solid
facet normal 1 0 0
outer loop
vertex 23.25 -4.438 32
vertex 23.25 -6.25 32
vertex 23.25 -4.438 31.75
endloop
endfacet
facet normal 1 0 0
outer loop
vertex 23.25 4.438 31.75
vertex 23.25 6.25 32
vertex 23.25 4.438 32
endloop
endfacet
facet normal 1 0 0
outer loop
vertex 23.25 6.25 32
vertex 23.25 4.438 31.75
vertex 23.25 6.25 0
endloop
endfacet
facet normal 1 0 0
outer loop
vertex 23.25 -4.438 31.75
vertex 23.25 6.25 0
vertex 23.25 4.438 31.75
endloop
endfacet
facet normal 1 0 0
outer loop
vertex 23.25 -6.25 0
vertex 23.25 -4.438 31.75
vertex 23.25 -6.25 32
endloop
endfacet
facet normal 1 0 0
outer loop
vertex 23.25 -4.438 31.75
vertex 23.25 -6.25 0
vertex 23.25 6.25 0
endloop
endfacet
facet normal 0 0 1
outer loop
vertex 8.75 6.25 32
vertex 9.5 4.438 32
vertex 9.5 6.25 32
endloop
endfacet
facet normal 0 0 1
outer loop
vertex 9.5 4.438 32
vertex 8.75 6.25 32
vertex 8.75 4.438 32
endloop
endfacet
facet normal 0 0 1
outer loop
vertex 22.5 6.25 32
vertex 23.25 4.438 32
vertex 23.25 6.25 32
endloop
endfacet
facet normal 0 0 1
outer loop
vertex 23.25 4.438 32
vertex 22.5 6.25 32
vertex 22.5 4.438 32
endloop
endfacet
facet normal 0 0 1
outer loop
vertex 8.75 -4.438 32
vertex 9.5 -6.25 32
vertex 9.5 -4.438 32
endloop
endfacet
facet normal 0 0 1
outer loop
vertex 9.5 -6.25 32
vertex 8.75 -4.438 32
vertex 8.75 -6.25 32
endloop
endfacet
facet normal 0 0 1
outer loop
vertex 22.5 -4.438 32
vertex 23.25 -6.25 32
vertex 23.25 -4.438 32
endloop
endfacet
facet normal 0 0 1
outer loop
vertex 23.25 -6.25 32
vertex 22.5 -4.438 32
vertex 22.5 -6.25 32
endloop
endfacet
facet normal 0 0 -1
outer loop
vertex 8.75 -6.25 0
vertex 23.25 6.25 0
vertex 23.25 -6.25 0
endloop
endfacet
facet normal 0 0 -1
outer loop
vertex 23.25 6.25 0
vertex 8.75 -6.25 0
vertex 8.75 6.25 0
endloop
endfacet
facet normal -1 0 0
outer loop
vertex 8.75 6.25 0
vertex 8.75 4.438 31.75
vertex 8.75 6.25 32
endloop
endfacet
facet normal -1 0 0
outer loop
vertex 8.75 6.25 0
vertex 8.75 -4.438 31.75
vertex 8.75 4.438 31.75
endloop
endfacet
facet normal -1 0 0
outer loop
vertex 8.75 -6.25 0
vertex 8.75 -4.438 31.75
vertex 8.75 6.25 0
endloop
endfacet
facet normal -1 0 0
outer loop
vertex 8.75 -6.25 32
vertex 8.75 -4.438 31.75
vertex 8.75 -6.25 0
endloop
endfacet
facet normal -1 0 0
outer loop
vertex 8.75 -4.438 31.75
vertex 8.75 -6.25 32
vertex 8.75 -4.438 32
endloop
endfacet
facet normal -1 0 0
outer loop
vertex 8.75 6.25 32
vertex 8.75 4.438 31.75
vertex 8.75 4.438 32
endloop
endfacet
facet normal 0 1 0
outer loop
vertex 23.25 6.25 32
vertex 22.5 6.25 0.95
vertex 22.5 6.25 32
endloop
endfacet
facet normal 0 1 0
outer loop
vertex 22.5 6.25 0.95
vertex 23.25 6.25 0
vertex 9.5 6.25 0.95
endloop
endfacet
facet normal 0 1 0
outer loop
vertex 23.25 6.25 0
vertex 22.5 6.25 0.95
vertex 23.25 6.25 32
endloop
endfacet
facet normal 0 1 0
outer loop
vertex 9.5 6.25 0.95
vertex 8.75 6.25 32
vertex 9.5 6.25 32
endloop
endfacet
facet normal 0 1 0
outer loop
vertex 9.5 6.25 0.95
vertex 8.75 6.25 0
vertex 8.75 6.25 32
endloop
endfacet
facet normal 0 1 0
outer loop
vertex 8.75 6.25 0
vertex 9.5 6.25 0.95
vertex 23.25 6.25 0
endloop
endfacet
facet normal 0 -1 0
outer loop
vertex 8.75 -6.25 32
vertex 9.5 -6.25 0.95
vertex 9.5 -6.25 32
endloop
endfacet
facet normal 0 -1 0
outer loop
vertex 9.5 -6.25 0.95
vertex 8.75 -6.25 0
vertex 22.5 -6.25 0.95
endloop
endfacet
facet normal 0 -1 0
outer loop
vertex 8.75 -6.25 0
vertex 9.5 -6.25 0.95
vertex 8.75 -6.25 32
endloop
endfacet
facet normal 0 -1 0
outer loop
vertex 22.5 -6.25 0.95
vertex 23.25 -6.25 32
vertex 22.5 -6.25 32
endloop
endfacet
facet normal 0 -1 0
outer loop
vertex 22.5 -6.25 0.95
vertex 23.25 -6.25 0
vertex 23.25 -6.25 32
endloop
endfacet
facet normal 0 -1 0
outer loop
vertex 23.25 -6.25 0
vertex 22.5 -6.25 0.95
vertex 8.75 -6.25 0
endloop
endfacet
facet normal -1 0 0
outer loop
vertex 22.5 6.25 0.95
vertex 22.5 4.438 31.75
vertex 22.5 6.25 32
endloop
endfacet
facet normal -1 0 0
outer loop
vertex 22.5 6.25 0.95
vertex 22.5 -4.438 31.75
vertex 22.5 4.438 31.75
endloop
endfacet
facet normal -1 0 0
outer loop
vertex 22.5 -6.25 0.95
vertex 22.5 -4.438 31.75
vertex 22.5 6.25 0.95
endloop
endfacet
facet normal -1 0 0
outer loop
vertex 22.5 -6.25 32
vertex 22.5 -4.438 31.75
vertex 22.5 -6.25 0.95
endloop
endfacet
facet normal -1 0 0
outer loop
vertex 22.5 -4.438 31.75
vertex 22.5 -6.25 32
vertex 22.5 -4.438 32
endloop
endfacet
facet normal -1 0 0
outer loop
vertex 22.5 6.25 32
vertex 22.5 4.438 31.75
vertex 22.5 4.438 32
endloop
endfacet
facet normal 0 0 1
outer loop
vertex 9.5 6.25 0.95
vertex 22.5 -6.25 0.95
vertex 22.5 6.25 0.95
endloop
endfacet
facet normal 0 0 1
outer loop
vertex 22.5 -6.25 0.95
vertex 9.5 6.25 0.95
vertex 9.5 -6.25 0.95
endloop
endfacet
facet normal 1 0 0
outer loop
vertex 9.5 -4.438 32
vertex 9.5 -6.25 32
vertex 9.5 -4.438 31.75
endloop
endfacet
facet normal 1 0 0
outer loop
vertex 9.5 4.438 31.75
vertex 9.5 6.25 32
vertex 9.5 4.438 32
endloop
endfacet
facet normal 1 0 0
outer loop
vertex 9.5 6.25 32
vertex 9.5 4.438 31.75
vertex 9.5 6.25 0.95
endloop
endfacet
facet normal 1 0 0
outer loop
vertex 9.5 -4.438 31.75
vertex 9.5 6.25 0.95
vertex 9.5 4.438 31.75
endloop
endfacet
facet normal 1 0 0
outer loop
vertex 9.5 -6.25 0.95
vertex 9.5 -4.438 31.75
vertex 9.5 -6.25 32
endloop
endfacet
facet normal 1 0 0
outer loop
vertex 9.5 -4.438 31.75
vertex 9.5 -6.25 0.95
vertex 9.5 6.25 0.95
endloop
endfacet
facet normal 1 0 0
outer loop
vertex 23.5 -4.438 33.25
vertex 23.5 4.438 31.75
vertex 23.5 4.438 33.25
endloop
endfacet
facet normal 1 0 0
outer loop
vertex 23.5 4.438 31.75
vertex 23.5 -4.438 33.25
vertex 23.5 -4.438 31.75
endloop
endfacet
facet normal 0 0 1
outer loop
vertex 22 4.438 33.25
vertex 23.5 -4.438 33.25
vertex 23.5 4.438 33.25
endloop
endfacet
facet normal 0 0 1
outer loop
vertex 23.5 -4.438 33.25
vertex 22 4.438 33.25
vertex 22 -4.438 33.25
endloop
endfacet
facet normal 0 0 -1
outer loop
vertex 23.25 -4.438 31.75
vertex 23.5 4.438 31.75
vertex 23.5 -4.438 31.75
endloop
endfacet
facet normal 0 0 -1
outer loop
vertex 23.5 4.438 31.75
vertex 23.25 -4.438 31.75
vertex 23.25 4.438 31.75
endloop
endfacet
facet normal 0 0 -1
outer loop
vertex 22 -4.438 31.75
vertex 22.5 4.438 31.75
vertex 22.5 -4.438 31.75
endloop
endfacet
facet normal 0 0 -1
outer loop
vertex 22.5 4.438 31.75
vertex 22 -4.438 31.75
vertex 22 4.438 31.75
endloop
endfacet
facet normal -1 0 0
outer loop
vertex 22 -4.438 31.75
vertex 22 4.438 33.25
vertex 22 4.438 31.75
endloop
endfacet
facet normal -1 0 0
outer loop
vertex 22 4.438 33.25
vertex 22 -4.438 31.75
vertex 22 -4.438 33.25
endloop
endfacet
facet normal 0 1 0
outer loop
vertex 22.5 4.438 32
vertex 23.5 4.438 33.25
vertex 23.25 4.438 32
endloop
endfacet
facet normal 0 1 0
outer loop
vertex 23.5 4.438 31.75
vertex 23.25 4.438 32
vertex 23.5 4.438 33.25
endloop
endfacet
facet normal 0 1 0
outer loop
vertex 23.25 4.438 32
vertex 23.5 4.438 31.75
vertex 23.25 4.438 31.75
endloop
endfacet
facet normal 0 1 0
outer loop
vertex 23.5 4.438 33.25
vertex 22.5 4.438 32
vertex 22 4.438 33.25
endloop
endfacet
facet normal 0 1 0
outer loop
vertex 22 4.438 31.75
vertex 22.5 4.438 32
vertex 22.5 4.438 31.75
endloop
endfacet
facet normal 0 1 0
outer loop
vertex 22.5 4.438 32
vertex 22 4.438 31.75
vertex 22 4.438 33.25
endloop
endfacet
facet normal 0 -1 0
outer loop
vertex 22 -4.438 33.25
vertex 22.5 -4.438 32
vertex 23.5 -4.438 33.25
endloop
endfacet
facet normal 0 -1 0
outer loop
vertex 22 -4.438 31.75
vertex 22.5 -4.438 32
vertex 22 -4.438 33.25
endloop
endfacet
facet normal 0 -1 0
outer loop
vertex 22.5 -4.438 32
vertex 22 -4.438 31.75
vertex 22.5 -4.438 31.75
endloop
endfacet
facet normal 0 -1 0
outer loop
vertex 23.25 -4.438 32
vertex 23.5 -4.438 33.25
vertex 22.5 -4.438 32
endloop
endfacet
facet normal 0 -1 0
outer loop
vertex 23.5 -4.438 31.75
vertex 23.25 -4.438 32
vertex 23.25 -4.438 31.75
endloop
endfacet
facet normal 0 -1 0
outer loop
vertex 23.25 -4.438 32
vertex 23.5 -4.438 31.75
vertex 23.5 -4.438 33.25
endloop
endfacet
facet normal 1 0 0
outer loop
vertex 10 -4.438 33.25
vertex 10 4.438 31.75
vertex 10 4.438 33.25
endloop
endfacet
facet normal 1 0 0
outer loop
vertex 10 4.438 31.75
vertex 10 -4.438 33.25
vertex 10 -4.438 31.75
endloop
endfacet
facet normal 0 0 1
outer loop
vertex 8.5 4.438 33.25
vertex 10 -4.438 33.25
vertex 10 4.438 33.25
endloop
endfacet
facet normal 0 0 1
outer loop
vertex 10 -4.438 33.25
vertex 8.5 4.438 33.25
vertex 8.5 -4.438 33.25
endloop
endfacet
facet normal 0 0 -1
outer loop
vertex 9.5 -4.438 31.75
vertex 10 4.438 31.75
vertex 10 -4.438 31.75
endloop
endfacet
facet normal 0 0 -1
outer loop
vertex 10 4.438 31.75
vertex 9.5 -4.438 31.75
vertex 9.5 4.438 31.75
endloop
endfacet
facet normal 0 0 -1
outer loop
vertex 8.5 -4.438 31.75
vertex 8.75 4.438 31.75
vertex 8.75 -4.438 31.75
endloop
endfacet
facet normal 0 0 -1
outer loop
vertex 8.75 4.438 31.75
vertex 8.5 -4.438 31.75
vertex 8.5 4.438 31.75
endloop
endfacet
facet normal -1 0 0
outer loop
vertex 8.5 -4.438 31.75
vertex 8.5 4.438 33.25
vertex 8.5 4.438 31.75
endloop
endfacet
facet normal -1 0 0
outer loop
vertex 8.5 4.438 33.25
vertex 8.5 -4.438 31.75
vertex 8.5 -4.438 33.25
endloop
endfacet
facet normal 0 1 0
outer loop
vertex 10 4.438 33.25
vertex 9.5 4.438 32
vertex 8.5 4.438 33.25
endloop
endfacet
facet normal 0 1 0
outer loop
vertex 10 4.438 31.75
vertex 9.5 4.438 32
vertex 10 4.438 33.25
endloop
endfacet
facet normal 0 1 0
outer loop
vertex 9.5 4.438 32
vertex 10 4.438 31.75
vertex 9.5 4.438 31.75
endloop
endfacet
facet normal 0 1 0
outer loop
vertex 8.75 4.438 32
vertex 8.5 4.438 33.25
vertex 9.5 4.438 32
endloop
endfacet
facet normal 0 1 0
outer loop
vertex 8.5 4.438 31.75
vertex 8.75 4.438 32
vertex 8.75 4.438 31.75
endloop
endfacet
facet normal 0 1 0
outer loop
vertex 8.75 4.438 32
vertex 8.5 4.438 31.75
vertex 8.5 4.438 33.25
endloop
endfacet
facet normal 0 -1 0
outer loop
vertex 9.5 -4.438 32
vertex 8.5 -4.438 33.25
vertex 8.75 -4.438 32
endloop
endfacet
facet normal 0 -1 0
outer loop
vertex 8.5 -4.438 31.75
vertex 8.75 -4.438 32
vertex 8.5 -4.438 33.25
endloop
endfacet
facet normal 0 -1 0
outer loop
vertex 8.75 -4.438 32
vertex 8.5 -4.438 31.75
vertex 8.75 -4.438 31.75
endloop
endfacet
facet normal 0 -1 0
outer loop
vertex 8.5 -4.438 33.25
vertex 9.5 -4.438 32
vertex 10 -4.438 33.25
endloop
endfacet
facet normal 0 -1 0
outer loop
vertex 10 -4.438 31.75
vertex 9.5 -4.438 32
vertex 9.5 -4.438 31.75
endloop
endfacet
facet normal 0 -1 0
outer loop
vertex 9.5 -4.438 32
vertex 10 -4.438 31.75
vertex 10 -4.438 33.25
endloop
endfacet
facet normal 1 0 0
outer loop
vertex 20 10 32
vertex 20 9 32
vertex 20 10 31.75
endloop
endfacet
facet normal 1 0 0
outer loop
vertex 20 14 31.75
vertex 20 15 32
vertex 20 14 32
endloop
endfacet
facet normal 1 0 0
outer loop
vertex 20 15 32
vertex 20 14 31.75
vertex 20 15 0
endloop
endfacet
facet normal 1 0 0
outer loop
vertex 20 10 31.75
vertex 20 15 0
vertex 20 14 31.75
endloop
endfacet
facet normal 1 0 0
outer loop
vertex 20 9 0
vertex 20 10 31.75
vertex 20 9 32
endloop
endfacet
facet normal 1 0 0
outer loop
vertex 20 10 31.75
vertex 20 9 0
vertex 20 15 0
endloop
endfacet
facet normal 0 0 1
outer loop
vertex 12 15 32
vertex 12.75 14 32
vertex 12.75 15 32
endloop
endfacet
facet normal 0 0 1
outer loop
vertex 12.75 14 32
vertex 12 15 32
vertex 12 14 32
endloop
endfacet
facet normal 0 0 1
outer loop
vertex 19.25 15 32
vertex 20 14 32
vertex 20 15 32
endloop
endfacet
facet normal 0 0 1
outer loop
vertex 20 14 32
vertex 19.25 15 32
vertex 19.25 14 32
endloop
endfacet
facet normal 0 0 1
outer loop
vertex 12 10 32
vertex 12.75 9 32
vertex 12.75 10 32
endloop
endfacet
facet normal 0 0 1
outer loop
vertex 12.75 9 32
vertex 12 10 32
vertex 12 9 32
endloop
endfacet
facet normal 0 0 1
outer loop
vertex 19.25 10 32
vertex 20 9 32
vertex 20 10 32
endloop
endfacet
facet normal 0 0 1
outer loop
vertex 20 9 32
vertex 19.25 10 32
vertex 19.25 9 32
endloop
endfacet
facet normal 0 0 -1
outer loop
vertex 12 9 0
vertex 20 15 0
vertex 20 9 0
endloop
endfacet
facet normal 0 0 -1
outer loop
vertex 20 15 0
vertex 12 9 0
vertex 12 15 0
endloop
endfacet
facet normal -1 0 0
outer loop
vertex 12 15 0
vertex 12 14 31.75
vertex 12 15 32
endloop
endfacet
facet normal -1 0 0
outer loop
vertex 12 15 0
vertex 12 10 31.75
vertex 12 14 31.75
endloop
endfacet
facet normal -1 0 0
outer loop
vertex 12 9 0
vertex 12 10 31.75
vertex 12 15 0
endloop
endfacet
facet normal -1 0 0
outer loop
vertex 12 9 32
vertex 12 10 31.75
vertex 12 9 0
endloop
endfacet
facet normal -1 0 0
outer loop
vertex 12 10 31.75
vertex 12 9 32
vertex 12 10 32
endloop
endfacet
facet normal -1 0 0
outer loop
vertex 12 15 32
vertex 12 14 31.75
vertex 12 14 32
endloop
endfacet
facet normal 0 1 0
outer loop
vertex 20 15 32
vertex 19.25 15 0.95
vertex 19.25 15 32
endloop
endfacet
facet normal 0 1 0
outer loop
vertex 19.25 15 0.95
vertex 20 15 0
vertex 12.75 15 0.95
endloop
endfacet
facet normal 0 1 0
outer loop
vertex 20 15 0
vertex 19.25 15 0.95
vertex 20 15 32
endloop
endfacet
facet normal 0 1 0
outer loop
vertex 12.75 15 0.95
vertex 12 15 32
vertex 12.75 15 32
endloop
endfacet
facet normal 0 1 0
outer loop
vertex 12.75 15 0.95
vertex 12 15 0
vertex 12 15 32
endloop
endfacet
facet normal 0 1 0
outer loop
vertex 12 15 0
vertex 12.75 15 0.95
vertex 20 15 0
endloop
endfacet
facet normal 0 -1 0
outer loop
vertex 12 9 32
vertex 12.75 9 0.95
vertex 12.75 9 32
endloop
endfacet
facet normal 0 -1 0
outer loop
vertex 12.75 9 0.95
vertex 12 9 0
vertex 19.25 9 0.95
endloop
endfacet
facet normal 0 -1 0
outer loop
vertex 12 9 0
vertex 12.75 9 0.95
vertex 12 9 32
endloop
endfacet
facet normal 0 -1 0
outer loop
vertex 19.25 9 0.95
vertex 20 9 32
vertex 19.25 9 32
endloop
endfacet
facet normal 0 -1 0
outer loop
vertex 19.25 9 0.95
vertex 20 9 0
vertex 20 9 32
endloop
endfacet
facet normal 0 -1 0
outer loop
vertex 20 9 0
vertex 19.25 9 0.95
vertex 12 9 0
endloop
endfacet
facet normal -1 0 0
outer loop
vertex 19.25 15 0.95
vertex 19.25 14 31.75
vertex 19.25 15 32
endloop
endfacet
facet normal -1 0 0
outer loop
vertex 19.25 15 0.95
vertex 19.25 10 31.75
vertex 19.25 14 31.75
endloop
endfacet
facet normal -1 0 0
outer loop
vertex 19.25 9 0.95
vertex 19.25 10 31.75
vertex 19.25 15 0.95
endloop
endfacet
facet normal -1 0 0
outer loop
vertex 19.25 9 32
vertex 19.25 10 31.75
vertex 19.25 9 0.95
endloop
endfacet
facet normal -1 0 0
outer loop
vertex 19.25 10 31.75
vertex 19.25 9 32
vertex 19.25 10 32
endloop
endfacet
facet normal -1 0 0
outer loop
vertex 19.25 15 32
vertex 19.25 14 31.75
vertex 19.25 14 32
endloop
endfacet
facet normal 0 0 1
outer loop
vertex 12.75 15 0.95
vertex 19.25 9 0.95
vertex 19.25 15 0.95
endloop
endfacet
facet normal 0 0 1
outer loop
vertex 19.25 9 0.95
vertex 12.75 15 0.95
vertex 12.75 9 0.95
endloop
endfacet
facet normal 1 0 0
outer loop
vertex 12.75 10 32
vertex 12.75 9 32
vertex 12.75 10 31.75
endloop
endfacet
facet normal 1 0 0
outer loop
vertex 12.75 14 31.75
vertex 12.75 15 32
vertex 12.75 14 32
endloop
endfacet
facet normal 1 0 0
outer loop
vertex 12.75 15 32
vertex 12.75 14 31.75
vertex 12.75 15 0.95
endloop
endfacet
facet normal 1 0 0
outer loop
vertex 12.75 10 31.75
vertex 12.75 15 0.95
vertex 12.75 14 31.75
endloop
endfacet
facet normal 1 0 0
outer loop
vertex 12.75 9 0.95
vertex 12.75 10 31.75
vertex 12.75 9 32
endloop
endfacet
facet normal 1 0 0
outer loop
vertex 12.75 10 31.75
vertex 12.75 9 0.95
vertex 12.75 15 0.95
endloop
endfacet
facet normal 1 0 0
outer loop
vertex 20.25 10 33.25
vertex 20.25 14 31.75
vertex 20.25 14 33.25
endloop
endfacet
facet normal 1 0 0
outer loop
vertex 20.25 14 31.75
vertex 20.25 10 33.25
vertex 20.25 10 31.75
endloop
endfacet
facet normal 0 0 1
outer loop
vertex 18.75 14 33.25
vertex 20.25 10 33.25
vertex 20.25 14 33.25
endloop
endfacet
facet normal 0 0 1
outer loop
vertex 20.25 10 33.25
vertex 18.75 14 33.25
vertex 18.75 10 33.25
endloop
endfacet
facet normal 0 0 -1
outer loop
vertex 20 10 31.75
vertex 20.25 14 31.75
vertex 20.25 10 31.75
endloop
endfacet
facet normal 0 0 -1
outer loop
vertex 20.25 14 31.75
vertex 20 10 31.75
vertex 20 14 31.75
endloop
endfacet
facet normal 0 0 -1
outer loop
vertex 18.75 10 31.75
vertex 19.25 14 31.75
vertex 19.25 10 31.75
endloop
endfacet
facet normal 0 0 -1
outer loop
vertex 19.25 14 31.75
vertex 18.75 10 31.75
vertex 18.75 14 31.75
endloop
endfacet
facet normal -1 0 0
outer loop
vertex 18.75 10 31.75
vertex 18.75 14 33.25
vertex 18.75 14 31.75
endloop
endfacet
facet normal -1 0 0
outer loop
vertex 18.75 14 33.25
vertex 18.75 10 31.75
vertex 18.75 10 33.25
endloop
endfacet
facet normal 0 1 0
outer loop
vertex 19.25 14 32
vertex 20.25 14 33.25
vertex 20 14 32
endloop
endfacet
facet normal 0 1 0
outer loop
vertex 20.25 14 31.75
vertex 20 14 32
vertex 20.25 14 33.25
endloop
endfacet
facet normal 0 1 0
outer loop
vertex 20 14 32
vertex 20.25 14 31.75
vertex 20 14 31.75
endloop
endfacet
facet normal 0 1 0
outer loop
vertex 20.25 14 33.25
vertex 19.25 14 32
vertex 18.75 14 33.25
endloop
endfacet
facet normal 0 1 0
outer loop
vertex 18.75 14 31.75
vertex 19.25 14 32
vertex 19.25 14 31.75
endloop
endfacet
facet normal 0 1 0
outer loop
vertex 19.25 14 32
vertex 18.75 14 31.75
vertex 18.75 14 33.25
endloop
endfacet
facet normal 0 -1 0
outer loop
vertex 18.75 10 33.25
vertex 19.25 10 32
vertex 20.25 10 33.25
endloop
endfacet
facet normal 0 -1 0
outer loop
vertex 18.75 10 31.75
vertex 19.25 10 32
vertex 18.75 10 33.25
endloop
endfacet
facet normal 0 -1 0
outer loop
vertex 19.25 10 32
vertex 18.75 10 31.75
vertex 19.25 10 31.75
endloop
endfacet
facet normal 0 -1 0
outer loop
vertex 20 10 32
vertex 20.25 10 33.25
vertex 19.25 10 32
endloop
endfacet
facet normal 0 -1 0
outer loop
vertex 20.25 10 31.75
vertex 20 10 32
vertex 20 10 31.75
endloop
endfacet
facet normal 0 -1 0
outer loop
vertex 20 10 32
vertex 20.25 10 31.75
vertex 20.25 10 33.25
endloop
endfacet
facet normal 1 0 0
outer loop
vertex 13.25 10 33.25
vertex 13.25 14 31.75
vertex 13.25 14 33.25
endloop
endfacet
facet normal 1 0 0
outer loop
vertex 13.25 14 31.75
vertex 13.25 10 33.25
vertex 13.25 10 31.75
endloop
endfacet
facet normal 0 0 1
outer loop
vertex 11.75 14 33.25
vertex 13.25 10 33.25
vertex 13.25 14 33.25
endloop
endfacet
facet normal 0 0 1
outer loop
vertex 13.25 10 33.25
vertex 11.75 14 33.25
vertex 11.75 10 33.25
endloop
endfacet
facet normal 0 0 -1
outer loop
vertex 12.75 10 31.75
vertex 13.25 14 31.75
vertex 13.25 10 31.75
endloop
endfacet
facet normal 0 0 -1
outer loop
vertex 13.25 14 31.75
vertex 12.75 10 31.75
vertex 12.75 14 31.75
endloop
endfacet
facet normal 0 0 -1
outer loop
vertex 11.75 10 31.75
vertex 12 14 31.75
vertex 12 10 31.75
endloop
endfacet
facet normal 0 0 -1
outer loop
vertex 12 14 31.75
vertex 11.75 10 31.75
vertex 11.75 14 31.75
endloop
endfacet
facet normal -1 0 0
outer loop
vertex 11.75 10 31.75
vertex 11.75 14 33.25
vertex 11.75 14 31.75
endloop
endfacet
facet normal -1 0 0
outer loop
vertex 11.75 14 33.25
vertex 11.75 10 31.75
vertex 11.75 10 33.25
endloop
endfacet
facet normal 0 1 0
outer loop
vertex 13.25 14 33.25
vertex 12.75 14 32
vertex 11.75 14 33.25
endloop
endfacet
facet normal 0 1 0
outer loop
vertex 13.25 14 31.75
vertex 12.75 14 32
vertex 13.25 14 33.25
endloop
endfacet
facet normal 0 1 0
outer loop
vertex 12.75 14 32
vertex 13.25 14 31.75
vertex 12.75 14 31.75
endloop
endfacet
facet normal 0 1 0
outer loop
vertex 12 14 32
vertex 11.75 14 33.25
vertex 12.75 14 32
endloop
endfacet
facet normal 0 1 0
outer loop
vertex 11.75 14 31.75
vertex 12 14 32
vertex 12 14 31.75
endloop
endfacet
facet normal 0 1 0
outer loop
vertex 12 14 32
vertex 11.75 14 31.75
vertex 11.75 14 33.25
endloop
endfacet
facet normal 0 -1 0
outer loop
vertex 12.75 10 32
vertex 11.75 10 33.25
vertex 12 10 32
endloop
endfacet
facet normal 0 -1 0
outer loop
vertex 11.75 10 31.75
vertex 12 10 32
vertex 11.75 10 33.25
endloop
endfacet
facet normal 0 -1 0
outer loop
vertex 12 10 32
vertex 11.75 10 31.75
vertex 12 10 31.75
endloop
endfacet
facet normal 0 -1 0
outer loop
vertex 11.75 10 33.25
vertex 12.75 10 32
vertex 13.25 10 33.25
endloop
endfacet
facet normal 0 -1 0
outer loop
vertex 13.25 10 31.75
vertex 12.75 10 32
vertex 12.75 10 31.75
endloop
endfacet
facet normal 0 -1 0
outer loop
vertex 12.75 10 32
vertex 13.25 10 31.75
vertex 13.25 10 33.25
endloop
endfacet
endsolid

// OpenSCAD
h=40;
gap=.5;
wall=2;



3Dprintflag=0;
hammer_tr = 3Dprintflag ? [0,0,0] : [0,0,0];
hammer_rot = 3Dprintflag ? [90,0,90] : [0,0,0];

// Hammer big
// translate(hammer_tr){rotate(hammer_rot){hammer(l=12.5);}}
translate(hammer_tr){
	translate([16,0,0]){rotate(hammer_rot){base(l=12.5);}}
}
// Hammer small
// translate([0,12,0]){rotate(hammer_rot){hammer(l=6);}}
translate(hammer_tr){
	translate([16,12,0]){rotate(hammer_rot){base(l=6);}}
}




	

module hammer(l) {
	translate([0,0,h/2+wall]) {
		difference() {
			cube(size=[l,l,h],center=true);
			#translate([l-wall/1.5,0,h*3/8-wall]) {cube(size=[l,l*3/4,wall],center=true);}
			#translate([-l+wall/1.5,0,h*3/8-wall]) {cube(size=[l,l*3/4,wall],center=true);}
		}
		
	}
}
	
module base(l) {
	translate([0,0,h*3/8]) {
		translate([(l/2)+gap,0,h*3/8+wall/4+wall]) {
			cube(size=[wall*3/4,l*3/4-gap,wall-gap],center=true);
		}
		translate([-(l/2)-gap,0,h*3/8+wall/4+wall]) {
			cube(size=[wall*3/4,l*3/4-gap,wall-gap],center=true);
		}
		difference() {
		 	translate([0,0,wall/2]) {cube(size=[l+wall,l,h*3/4+wall],center=true);}
		 	#translate([0,0,wall-.5]) {cube(size=[l+gap,l+wall+gap,h*3/4+gap+gap+.1],center=true);}
		}
	}
}
